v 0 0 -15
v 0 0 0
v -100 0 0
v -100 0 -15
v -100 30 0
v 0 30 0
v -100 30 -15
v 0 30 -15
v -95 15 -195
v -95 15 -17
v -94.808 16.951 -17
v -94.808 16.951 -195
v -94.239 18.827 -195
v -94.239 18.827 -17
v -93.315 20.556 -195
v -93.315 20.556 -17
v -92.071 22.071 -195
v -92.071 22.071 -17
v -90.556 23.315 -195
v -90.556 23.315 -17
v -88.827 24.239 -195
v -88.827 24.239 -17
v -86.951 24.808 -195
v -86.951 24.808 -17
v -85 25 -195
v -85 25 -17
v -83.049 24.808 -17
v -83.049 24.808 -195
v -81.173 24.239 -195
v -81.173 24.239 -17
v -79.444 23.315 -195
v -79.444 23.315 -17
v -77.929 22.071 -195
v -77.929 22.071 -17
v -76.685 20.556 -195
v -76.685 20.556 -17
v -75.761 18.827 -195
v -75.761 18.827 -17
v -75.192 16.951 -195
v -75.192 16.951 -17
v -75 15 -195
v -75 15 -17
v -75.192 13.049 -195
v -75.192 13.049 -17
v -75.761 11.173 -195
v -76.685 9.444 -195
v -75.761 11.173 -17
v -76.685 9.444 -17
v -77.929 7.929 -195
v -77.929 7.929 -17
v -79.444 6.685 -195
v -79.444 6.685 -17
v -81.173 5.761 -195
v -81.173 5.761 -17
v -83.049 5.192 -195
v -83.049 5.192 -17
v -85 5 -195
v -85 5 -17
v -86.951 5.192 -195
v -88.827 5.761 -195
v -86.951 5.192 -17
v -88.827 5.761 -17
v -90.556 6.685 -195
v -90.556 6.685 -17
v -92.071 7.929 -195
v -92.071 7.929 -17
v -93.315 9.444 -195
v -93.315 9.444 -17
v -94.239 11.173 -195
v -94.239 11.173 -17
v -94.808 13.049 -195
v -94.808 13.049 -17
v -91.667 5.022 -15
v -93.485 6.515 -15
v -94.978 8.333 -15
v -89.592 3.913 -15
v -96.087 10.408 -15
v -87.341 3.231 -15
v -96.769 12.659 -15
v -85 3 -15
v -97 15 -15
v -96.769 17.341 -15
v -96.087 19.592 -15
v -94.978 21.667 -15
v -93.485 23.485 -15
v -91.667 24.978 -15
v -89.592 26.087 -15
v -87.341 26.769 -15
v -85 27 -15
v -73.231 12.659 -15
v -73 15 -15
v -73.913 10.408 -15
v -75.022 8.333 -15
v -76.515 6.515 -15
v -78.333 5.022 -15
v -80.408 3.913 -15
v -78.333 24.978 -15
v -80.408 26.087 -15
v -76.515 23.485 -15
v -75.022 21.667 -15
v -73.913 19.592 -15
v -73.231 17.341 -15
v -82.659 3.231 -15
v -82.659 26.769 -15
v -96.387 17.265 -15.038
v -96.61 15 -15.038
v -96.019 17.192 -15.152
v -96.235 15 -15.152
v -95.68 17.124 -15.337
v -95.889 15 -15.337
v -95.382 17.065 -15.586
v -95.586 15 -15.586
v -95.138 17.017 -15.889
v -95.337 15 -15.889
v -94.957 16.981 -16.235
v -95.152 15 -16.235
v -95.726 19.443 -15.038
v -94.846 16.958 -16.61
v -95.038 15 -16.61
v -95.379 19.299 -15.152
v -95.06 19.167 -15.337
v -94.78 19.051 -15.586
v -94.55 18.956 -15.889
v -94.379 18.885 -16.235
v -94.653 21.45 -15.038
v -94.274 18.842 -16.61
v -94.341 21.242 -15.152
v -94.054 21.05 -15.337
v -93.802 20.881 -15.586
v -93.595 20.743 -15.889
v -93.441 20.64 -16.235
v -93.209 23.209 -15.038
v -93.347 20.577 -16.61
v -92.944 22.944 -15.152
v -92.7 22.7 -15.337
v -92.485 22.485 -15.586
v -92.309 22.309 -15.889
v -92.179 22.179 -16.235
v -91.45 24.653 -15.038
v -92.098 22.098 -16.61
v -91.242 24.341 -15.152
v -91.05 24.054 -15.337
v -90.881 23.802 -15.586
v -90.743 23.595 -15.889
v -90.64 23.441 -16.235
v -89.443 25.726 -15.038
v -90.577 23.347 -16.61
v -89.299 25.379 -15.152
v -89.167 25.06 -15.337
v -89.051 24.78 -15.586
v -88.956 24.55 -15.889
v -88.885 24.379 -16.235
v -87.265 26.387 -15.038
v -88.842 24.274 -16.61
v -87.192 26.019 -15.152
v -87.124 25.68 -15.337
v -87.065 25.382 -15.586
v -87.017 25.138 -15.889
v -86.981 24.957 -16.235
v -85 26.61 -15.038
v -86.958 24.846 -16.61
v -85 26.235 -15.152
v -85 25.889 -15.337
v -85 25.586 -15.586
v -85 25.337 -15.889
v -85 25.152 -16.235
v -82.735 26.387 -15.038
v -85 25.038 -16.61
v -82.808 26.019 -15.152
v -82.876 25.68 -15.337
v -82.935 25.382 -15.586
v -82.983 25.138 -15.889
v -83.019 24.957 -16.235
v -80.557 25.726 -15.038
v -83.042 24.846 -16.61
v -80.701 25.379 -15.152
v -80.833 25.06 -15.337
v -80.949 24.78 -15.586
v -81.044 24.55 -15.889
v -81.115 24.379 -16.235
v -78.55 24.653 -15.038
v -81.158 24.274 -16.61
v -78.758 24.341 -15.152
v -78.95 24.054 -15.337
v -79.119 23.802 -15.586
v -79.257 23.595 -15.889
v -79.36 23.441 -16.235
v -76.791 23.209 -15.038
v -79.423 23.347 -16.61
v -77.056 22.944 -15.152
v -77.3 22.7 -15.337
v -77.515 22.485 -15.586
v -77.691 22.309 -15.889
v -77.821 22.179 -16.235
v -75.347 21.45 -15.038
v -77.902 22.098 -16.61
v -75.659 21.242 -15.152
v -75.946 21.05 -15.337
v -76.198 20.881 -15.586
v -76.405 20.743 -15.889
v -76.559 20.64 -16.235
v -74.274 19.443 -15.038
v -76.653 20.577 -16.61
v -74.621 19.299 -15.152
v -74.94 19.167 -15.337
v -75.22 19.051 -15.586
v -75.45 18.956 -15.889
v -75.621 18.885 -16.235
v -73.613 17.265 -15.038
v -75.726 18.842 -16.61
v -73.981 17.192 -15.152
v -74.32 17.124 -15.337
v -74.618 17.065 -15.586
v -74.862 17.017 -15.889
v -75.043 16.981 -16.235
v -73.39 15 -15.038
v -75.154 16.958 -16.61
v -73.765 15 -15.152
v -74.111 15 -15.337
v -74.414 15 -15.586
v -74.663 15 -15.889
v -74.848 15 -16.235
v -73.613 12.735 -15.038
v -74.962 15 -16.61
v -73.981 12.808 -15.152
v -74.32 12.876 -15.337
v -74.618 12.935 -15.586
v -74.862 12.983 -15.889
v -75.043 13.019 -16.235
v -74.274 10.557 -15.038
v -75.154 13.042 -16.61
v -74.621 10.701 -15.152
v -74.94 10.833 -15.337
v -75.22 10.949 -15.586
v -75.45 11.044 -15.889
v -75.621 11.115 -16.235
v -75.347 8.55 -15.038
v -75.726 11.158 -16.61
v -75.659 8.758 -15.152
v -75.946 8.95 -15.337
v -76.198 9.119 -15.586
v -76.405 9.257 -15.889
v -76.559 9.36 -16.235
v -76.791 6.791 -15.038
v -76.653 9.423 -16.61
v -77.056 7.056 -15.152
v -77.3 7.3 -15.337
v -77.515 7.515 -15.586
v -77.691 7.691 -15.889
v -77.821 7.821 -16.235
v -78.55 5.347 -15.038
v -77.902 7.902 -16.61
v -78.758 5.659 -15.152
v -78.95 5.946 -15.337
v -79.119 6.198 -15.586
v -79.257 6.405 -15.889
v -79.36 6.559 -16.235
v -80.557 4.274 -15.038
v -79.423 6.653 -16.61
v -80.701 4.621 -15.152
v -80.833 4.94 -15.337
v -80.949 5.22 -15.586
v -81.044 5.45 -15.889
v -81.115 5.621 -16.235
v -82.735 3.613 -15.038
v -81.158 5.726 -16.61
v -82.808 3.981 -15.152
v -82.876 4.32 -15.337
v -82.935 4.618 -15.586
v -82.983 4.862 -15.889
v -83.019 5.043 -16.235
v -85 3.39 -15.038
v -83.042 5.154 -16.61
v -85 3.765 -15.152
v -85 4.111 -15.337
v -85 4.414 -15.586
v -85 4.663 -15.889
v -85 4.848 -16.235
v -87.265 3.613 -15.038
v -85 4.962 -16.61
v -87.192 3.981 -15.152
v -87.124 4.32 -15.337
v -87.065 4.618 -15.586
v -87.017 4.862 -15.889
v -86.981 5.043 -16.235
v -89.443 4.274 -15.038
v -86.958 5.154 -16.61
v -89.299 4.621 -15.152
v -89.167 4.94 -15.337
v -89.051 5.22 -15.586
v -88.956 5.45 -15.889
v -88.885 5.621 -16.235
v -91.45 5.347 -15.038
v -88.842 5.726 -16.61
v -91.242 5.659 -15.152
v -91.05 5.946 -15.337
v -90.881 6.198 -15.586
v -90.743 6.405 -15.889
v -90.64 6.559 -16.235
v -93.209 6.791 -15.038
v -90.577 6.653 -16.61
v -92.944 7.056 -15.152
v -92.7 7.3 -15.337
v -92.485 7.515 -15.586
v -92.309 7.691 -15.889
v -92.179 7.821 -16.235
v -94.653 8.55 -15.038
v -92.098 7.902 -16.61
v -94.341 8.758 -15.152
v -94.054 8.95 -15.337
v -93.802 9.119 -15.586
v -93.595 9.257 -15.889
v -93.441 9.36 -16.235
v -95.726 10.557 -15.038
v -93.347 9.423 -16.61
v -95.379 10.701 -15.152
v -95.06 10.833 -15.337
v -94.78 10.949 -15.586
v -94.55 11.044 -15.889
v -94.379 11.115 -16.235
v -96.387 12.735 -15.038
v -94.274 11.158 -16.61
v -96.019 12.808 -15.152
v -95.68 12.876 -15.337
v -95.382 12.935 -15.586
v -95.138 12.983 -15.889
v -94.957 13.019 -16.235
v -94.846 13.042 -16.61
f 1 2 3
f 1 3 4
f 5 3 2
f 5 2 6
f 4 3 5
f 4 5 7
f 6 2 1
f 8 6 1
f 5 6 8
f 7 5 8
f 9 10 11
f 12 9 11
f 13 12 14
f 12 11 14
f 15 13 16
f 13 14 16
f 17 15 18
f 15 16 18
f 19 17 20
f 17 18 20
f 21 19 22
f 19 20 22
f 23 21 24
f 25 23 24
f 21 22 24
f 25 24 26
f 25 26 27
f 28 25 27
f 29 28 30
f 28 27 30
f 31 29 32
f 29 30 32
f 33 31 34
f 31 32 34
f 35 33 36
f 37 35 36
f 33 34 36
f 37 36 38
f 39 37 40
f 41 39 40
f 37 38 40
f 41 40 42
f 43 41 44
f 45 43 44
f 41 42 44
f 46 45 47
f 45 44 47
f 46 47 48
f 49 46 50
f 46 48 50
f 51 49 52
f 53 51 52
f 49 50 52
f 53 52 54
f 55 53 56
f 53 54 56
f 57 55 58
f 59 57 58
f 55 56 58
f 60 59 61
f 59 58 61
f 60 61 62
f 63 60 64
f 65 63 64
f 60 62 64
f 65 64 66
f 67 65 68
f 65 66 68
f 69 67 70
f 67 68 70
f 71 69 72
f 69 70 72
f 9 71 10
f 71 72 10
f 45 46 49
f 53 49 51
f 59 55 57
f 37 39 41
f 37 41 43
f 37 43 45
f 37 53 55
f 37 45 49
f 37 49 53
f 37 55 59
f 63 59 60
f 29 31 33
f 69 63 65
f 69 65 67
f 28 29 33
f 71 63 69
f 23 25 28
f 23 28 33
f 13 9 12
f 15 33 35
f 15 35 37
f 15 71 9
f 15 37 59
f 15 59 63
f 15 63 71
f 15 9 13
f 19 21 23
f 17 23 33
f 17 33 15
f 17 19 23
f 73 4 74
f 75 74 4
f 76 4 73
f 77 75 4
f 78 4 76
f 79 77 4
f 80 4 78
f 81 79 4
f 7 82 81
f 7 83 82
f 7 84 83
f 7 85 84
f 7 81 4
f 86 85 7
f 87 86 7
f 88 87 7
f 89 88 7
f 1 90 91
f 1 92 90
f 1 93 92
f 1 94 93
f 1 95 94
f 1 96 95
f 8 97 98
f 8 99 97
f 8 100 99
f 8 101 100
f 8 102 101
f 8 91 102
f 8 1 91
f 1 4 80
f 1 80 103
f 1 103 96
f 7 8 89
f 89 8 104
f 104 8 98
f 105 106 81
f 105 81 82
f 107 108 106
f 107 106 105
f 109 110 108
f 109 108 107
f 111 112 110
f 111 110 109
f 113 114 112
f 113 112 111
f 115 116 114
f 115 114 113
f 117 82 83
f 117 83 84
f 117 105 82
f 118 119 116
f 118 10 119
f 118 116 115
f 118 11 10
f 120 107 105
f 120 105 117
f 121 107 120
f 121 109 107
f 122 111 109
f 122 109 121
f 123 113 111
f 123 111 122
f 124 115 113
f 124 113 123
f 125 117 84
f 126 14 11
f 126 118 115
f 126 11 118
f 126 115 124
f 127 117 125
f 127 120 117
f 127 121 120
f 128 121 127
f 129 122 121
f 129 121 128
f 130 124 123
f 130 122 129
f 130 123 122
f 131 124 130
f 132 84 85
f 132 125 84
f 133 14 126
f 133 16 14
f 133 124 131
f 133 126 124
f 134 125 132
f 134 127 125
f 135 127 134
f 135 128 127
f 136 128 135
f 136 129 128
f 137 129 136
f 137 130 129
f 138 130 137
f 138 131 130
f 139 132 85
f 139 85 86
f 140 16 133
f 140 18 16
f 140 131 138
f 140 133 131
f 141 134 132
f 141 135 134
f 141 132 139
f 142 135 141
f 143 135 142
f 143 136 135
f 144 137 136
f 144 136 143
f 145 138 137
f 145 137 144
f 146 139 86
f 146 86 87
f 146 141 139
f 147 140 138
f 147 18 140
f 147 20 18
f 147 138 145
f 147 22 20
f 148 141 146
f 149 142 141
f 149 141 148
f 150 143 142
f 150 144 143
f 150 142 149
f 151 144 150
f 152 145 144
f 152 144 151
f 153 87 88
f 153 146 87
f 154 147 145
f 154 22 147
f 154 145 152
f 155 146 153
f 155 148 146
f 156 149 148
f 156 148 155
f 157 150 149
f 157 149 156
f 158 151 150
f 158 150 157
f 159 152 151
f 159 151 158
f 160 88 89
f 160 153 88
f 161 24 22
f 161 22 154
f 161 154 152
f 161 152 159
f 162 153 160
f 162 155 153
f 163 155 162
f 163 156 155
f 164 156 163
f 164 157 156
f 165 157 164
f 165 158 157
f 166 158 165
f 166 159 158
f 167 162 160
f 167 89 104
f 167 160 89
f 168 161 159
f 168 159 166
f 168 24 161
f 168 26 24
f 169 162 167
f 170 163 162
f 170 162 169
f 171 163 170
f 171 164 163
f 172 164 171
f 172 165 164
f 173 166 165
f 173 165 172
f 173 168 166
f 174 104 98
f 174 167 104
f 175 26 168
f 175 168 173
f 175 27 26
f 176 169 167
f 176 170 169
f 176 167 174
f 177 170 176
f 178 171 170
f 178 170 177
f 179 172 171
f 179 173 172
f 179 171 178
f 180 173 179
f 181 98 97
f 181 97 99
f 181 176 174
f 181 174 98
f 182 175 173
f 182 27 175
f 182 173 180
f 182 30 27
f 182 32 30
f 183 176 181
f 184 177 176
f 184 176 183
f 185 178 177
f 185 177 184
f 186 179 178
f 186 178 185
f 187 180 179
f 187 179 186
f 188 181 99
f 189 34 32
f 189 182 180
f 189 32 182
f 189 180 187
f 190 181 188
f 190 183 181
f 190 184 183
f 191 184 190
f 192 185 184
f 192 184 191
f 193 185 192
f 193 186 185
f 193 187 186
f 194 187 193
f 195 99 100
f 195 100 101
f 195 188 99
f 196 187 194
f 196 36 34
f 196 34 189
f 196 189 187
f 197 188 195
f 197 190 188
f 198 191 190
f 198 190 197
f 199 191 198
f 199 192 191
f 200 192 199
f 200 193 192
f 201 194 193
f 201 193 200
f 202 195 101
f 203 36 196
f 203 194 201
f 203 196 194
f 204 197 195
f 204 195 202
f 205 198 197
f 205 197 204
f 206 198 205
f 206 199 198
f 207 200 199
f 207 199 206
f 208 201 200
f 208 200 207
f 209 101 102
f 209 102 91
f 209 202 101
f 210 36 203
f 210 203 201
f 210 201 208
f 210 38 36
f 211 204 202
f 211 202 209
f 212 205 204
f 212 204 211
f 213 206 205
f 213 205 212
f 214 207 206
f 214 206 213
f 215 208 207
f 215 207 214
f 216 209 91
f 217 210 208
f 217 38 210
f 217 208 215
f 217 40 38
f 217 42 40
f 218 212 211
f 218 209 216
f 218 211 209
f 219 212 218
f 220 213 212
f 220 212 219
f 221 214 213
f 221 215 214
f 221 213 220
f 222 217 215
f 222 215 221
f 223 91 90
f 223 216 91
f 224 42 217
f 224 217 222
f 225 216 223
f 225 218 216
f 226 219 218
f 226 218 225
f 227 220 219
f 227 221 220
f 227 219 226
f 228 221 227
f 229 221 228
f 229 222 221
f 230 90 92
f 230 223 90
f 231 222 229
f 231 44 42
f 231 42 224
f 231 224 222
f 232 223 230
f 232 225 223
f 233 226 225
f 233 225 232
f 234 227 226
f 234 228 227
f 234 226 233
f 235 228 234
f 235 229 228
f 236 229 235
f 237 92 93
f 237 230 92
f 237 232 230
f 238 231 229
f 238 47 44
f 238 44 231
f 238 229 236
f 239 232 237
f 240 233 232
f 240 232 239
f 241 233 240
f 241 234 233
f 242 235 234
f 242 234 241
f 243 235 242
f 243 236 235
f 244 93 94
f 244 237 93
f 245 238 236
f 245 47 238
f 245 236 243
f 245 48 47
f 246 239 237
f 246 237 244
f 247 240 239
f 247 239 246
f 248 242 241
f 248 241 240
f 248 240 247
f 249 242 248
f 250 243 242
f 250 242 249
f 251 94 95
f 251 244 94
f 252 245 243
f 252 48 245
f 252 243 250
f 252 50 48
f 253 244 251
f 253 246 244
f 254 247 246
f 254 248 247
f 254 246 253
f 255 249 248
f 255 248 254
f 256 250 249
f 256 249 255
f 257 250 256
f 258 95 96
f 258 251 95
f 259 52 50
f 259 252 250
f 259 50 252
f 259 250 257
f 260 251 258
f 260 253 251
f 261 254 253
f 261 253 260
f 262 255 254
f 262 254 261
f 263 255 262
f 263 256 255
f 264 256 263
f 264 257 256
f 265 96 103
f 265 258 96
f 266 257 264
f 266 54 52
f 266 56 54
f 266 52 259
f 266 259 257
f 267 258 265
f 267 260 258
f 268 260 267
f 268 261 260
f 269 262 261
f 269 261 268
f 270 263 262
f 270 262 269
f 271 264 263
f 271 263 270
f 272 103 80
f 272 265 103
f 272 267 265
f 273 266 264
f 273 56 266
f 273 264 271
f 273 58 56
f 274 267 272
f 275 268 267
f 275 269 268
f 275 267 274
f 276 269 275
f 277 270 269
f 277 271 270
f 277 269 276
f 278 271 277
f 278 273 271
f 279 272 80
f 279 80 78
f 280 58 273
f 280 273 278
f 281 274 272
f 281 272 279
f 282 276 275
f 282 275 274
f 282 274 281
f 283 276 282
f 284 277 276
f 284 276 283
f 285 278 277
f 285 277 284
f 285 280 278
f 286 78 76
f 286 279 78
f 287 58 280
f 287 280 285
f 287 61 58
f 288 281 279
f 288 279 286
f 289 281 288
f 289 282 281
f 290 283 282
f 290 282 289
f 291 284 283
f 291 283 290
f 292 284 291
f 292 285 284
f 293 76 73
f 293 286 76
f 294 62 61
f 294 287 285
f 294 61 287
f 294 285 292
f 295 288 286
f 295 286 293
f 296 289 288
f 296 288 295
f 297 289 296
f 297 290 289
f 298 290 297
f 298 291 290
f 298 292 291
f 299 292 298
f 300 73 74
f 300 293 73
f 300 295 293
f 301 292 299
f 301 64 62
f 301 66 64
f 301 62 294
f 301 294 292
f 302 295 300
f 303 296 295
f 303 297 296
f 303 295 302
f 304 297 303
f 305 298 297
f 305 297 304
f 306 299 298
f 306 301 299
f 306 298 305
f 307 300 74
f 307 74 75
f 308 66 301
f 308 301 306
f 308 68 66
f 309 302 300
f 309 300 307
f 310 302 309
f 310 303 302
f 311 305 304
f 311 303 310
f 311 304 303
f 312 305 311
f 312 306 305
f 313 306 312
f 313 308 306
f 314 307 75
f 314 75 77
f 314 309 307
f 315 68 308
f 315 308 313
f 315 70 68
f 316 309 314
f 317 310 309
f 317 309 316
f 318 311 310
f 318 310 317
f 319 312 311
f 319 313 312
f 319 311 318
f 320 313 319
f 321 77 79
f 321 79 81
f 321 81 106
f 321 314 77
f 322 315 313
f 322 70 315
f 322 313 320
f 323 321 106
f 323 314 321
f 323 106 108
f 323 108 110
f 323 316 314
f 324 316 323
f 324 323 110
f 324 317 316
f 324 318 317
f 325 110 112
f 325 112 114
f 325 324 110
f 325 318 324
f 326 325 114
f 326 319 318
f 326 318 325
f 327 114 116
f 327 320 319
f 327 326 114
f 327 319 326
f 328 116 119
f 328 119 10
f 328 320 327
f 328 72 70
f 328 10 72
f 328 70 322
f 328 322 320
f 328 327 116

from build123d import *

# Parameters (mm, degrees)
SKETCH1_W           = 15
SKETCH1_H           = 30
BOSS_EXTRUDE1_DEPTH = 100
SKETCH2_R           = 10
BOSS_EXTRUDE2_DEPTH = 180
FILLET1_R           = 2


with BuildPart() as part:
    # Sketch1 → Boss-Extrude1 (new body)
    with BuildSketch(Plane(origin=(0, 0, 0), x_dir=(0, 0, -1), z_dir=(1, 0, 0))):
        with Locations((7.5, 15)):
            Rectangle(SKETCH1_W, SKETCH1_H)
    extrude(amount=-BOSS_EXTRUDE1_DEPTH)

    # Sketch2 → Boss-Extrude2 (add)
    with BuildSketch(Plane(origin=(0, 0, -15), x_dir=(-1, 0, 0), z_dir=(0, 0, -1))):
        with Locations((85, 15)):
            Circle(SKETCH2_R)
    extrude(amount=BOSS_EXTRUDE2_DEPTH)

    # Fillet1
    fillet1_edges = [part.edges().sort_by_distance(p)[0] for p in [
        (-75, 15, -15),
    ]]
    fillet(fillet1_edges, radius=FILLET1_R)


solid = part.part
